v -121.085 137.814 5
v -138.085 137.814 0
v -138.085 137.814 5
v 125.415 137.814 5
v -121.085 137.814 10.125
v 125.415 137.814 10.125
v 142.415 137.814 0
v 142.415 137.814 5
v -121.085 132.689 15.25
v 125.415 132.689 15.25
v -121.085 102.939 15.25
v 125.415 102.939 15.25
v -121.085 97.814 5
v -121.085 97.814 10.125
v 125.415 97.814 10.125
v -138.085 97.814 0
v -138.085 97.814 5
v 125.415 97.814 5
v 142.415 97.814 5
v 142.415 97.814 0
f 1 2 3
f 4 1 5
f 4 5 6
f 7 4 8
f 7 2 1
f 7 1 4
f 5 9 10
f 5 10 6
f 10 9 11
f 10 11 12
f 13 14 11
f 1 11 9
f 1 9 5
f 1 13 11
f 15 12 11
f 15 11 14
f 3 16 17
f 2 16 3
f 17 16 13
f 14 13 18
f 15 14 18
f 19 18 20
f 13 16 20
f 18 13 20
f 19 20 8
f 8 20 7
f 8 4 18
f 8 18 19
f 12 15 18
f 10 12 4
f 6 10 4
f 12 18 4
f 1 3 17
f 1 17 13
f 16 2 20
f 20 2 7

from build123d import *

# Parameters (mm, degrees)
ESQUISSE1_W             = 280.5
ESQUISSE1_H             = 40
BOSS_EXTRU_1_DEPTH      = 5
ESQUISSE2_W             = 246.5
ESQUISSE2_H             = 40
BOSS_EXTRU_2_DEPTH      = 10.25
ENL_V_MAT_EXTRU_1_REACH = 265.5


with BuildPart() as part:
    # Esquisse1 → Boss.-Extru.1 (new body)
    with BuildSketch(Plane.XY):
        with Locations((2.164847162, 117.813864629)):
            Rectangle(ESQUISSE1_W, ESQUISSE1_H)
    extrude(amount=BOSS_EXTRU_1_DEPTH)

    # Esquisse2 → Boss.-Extru.2 (add)
    with BuildSketch(Plane.XY.offset(5)):
        with Locations((2.164847162, 117.813864629)):
            Rectangle(ESQUISSE2_W, ESQUISSE2_H)
    extrude(amount=BOSS_EXTRU_2_DEPTH)

    # Esquisse3 → Enlèv. mat.-Extru.1 (cut, up to next)
    with BuildSketch(Plane.ZY.offset(121.085152838), mode=Mode.PRIVATE) as enl_v_mat_extru_1_sk1:
        Polygon((10.125, 137.813864629), (15.25, 137.813864629), (15.25, 132.688864629), align=None)
    enl_v_mat_extru_1_tool1 = extrude(enl_v_mat_extru_1_sk1.sketch, amount=-ENL_V_MAT_EXTRU_1_REACH, mode=Mode.PRIVATE) & part.part
    add(enl_v_mat_extru_1_tool1.solids().sort_by_distance((-121.085153, 136.105531, 13.541667))[0], mode=Mode.SUBTRACT)
    # Esquisse3 → Enlèv. mat.-Extru.1 (cut, up to next)
    with BuildSketch(Plane.ZY.offset(121.085152838), mode=Mode.PRIVATE) as enl_v_mat_extru_1_sk2:
        Polygon((15.25, 97.813864629), (15.25, 102.938864629), (10.125, 97.813864629), align=None)
    enl_v_mat_extru_1_tool2 = extrude(enl_v_mat_extru_1_sk2.sketch, amount=-ENL_V_MAT_EXTRU_1_REACH, mode=Mode.PRIVATE) & part.part
    add(enl_v_mat_extru_1_tool2.solids().sort_by_distance((-121.085153, 99.522198, 13.541667))[0], mode=Mode.SUBTRACT)


solid = part.part
